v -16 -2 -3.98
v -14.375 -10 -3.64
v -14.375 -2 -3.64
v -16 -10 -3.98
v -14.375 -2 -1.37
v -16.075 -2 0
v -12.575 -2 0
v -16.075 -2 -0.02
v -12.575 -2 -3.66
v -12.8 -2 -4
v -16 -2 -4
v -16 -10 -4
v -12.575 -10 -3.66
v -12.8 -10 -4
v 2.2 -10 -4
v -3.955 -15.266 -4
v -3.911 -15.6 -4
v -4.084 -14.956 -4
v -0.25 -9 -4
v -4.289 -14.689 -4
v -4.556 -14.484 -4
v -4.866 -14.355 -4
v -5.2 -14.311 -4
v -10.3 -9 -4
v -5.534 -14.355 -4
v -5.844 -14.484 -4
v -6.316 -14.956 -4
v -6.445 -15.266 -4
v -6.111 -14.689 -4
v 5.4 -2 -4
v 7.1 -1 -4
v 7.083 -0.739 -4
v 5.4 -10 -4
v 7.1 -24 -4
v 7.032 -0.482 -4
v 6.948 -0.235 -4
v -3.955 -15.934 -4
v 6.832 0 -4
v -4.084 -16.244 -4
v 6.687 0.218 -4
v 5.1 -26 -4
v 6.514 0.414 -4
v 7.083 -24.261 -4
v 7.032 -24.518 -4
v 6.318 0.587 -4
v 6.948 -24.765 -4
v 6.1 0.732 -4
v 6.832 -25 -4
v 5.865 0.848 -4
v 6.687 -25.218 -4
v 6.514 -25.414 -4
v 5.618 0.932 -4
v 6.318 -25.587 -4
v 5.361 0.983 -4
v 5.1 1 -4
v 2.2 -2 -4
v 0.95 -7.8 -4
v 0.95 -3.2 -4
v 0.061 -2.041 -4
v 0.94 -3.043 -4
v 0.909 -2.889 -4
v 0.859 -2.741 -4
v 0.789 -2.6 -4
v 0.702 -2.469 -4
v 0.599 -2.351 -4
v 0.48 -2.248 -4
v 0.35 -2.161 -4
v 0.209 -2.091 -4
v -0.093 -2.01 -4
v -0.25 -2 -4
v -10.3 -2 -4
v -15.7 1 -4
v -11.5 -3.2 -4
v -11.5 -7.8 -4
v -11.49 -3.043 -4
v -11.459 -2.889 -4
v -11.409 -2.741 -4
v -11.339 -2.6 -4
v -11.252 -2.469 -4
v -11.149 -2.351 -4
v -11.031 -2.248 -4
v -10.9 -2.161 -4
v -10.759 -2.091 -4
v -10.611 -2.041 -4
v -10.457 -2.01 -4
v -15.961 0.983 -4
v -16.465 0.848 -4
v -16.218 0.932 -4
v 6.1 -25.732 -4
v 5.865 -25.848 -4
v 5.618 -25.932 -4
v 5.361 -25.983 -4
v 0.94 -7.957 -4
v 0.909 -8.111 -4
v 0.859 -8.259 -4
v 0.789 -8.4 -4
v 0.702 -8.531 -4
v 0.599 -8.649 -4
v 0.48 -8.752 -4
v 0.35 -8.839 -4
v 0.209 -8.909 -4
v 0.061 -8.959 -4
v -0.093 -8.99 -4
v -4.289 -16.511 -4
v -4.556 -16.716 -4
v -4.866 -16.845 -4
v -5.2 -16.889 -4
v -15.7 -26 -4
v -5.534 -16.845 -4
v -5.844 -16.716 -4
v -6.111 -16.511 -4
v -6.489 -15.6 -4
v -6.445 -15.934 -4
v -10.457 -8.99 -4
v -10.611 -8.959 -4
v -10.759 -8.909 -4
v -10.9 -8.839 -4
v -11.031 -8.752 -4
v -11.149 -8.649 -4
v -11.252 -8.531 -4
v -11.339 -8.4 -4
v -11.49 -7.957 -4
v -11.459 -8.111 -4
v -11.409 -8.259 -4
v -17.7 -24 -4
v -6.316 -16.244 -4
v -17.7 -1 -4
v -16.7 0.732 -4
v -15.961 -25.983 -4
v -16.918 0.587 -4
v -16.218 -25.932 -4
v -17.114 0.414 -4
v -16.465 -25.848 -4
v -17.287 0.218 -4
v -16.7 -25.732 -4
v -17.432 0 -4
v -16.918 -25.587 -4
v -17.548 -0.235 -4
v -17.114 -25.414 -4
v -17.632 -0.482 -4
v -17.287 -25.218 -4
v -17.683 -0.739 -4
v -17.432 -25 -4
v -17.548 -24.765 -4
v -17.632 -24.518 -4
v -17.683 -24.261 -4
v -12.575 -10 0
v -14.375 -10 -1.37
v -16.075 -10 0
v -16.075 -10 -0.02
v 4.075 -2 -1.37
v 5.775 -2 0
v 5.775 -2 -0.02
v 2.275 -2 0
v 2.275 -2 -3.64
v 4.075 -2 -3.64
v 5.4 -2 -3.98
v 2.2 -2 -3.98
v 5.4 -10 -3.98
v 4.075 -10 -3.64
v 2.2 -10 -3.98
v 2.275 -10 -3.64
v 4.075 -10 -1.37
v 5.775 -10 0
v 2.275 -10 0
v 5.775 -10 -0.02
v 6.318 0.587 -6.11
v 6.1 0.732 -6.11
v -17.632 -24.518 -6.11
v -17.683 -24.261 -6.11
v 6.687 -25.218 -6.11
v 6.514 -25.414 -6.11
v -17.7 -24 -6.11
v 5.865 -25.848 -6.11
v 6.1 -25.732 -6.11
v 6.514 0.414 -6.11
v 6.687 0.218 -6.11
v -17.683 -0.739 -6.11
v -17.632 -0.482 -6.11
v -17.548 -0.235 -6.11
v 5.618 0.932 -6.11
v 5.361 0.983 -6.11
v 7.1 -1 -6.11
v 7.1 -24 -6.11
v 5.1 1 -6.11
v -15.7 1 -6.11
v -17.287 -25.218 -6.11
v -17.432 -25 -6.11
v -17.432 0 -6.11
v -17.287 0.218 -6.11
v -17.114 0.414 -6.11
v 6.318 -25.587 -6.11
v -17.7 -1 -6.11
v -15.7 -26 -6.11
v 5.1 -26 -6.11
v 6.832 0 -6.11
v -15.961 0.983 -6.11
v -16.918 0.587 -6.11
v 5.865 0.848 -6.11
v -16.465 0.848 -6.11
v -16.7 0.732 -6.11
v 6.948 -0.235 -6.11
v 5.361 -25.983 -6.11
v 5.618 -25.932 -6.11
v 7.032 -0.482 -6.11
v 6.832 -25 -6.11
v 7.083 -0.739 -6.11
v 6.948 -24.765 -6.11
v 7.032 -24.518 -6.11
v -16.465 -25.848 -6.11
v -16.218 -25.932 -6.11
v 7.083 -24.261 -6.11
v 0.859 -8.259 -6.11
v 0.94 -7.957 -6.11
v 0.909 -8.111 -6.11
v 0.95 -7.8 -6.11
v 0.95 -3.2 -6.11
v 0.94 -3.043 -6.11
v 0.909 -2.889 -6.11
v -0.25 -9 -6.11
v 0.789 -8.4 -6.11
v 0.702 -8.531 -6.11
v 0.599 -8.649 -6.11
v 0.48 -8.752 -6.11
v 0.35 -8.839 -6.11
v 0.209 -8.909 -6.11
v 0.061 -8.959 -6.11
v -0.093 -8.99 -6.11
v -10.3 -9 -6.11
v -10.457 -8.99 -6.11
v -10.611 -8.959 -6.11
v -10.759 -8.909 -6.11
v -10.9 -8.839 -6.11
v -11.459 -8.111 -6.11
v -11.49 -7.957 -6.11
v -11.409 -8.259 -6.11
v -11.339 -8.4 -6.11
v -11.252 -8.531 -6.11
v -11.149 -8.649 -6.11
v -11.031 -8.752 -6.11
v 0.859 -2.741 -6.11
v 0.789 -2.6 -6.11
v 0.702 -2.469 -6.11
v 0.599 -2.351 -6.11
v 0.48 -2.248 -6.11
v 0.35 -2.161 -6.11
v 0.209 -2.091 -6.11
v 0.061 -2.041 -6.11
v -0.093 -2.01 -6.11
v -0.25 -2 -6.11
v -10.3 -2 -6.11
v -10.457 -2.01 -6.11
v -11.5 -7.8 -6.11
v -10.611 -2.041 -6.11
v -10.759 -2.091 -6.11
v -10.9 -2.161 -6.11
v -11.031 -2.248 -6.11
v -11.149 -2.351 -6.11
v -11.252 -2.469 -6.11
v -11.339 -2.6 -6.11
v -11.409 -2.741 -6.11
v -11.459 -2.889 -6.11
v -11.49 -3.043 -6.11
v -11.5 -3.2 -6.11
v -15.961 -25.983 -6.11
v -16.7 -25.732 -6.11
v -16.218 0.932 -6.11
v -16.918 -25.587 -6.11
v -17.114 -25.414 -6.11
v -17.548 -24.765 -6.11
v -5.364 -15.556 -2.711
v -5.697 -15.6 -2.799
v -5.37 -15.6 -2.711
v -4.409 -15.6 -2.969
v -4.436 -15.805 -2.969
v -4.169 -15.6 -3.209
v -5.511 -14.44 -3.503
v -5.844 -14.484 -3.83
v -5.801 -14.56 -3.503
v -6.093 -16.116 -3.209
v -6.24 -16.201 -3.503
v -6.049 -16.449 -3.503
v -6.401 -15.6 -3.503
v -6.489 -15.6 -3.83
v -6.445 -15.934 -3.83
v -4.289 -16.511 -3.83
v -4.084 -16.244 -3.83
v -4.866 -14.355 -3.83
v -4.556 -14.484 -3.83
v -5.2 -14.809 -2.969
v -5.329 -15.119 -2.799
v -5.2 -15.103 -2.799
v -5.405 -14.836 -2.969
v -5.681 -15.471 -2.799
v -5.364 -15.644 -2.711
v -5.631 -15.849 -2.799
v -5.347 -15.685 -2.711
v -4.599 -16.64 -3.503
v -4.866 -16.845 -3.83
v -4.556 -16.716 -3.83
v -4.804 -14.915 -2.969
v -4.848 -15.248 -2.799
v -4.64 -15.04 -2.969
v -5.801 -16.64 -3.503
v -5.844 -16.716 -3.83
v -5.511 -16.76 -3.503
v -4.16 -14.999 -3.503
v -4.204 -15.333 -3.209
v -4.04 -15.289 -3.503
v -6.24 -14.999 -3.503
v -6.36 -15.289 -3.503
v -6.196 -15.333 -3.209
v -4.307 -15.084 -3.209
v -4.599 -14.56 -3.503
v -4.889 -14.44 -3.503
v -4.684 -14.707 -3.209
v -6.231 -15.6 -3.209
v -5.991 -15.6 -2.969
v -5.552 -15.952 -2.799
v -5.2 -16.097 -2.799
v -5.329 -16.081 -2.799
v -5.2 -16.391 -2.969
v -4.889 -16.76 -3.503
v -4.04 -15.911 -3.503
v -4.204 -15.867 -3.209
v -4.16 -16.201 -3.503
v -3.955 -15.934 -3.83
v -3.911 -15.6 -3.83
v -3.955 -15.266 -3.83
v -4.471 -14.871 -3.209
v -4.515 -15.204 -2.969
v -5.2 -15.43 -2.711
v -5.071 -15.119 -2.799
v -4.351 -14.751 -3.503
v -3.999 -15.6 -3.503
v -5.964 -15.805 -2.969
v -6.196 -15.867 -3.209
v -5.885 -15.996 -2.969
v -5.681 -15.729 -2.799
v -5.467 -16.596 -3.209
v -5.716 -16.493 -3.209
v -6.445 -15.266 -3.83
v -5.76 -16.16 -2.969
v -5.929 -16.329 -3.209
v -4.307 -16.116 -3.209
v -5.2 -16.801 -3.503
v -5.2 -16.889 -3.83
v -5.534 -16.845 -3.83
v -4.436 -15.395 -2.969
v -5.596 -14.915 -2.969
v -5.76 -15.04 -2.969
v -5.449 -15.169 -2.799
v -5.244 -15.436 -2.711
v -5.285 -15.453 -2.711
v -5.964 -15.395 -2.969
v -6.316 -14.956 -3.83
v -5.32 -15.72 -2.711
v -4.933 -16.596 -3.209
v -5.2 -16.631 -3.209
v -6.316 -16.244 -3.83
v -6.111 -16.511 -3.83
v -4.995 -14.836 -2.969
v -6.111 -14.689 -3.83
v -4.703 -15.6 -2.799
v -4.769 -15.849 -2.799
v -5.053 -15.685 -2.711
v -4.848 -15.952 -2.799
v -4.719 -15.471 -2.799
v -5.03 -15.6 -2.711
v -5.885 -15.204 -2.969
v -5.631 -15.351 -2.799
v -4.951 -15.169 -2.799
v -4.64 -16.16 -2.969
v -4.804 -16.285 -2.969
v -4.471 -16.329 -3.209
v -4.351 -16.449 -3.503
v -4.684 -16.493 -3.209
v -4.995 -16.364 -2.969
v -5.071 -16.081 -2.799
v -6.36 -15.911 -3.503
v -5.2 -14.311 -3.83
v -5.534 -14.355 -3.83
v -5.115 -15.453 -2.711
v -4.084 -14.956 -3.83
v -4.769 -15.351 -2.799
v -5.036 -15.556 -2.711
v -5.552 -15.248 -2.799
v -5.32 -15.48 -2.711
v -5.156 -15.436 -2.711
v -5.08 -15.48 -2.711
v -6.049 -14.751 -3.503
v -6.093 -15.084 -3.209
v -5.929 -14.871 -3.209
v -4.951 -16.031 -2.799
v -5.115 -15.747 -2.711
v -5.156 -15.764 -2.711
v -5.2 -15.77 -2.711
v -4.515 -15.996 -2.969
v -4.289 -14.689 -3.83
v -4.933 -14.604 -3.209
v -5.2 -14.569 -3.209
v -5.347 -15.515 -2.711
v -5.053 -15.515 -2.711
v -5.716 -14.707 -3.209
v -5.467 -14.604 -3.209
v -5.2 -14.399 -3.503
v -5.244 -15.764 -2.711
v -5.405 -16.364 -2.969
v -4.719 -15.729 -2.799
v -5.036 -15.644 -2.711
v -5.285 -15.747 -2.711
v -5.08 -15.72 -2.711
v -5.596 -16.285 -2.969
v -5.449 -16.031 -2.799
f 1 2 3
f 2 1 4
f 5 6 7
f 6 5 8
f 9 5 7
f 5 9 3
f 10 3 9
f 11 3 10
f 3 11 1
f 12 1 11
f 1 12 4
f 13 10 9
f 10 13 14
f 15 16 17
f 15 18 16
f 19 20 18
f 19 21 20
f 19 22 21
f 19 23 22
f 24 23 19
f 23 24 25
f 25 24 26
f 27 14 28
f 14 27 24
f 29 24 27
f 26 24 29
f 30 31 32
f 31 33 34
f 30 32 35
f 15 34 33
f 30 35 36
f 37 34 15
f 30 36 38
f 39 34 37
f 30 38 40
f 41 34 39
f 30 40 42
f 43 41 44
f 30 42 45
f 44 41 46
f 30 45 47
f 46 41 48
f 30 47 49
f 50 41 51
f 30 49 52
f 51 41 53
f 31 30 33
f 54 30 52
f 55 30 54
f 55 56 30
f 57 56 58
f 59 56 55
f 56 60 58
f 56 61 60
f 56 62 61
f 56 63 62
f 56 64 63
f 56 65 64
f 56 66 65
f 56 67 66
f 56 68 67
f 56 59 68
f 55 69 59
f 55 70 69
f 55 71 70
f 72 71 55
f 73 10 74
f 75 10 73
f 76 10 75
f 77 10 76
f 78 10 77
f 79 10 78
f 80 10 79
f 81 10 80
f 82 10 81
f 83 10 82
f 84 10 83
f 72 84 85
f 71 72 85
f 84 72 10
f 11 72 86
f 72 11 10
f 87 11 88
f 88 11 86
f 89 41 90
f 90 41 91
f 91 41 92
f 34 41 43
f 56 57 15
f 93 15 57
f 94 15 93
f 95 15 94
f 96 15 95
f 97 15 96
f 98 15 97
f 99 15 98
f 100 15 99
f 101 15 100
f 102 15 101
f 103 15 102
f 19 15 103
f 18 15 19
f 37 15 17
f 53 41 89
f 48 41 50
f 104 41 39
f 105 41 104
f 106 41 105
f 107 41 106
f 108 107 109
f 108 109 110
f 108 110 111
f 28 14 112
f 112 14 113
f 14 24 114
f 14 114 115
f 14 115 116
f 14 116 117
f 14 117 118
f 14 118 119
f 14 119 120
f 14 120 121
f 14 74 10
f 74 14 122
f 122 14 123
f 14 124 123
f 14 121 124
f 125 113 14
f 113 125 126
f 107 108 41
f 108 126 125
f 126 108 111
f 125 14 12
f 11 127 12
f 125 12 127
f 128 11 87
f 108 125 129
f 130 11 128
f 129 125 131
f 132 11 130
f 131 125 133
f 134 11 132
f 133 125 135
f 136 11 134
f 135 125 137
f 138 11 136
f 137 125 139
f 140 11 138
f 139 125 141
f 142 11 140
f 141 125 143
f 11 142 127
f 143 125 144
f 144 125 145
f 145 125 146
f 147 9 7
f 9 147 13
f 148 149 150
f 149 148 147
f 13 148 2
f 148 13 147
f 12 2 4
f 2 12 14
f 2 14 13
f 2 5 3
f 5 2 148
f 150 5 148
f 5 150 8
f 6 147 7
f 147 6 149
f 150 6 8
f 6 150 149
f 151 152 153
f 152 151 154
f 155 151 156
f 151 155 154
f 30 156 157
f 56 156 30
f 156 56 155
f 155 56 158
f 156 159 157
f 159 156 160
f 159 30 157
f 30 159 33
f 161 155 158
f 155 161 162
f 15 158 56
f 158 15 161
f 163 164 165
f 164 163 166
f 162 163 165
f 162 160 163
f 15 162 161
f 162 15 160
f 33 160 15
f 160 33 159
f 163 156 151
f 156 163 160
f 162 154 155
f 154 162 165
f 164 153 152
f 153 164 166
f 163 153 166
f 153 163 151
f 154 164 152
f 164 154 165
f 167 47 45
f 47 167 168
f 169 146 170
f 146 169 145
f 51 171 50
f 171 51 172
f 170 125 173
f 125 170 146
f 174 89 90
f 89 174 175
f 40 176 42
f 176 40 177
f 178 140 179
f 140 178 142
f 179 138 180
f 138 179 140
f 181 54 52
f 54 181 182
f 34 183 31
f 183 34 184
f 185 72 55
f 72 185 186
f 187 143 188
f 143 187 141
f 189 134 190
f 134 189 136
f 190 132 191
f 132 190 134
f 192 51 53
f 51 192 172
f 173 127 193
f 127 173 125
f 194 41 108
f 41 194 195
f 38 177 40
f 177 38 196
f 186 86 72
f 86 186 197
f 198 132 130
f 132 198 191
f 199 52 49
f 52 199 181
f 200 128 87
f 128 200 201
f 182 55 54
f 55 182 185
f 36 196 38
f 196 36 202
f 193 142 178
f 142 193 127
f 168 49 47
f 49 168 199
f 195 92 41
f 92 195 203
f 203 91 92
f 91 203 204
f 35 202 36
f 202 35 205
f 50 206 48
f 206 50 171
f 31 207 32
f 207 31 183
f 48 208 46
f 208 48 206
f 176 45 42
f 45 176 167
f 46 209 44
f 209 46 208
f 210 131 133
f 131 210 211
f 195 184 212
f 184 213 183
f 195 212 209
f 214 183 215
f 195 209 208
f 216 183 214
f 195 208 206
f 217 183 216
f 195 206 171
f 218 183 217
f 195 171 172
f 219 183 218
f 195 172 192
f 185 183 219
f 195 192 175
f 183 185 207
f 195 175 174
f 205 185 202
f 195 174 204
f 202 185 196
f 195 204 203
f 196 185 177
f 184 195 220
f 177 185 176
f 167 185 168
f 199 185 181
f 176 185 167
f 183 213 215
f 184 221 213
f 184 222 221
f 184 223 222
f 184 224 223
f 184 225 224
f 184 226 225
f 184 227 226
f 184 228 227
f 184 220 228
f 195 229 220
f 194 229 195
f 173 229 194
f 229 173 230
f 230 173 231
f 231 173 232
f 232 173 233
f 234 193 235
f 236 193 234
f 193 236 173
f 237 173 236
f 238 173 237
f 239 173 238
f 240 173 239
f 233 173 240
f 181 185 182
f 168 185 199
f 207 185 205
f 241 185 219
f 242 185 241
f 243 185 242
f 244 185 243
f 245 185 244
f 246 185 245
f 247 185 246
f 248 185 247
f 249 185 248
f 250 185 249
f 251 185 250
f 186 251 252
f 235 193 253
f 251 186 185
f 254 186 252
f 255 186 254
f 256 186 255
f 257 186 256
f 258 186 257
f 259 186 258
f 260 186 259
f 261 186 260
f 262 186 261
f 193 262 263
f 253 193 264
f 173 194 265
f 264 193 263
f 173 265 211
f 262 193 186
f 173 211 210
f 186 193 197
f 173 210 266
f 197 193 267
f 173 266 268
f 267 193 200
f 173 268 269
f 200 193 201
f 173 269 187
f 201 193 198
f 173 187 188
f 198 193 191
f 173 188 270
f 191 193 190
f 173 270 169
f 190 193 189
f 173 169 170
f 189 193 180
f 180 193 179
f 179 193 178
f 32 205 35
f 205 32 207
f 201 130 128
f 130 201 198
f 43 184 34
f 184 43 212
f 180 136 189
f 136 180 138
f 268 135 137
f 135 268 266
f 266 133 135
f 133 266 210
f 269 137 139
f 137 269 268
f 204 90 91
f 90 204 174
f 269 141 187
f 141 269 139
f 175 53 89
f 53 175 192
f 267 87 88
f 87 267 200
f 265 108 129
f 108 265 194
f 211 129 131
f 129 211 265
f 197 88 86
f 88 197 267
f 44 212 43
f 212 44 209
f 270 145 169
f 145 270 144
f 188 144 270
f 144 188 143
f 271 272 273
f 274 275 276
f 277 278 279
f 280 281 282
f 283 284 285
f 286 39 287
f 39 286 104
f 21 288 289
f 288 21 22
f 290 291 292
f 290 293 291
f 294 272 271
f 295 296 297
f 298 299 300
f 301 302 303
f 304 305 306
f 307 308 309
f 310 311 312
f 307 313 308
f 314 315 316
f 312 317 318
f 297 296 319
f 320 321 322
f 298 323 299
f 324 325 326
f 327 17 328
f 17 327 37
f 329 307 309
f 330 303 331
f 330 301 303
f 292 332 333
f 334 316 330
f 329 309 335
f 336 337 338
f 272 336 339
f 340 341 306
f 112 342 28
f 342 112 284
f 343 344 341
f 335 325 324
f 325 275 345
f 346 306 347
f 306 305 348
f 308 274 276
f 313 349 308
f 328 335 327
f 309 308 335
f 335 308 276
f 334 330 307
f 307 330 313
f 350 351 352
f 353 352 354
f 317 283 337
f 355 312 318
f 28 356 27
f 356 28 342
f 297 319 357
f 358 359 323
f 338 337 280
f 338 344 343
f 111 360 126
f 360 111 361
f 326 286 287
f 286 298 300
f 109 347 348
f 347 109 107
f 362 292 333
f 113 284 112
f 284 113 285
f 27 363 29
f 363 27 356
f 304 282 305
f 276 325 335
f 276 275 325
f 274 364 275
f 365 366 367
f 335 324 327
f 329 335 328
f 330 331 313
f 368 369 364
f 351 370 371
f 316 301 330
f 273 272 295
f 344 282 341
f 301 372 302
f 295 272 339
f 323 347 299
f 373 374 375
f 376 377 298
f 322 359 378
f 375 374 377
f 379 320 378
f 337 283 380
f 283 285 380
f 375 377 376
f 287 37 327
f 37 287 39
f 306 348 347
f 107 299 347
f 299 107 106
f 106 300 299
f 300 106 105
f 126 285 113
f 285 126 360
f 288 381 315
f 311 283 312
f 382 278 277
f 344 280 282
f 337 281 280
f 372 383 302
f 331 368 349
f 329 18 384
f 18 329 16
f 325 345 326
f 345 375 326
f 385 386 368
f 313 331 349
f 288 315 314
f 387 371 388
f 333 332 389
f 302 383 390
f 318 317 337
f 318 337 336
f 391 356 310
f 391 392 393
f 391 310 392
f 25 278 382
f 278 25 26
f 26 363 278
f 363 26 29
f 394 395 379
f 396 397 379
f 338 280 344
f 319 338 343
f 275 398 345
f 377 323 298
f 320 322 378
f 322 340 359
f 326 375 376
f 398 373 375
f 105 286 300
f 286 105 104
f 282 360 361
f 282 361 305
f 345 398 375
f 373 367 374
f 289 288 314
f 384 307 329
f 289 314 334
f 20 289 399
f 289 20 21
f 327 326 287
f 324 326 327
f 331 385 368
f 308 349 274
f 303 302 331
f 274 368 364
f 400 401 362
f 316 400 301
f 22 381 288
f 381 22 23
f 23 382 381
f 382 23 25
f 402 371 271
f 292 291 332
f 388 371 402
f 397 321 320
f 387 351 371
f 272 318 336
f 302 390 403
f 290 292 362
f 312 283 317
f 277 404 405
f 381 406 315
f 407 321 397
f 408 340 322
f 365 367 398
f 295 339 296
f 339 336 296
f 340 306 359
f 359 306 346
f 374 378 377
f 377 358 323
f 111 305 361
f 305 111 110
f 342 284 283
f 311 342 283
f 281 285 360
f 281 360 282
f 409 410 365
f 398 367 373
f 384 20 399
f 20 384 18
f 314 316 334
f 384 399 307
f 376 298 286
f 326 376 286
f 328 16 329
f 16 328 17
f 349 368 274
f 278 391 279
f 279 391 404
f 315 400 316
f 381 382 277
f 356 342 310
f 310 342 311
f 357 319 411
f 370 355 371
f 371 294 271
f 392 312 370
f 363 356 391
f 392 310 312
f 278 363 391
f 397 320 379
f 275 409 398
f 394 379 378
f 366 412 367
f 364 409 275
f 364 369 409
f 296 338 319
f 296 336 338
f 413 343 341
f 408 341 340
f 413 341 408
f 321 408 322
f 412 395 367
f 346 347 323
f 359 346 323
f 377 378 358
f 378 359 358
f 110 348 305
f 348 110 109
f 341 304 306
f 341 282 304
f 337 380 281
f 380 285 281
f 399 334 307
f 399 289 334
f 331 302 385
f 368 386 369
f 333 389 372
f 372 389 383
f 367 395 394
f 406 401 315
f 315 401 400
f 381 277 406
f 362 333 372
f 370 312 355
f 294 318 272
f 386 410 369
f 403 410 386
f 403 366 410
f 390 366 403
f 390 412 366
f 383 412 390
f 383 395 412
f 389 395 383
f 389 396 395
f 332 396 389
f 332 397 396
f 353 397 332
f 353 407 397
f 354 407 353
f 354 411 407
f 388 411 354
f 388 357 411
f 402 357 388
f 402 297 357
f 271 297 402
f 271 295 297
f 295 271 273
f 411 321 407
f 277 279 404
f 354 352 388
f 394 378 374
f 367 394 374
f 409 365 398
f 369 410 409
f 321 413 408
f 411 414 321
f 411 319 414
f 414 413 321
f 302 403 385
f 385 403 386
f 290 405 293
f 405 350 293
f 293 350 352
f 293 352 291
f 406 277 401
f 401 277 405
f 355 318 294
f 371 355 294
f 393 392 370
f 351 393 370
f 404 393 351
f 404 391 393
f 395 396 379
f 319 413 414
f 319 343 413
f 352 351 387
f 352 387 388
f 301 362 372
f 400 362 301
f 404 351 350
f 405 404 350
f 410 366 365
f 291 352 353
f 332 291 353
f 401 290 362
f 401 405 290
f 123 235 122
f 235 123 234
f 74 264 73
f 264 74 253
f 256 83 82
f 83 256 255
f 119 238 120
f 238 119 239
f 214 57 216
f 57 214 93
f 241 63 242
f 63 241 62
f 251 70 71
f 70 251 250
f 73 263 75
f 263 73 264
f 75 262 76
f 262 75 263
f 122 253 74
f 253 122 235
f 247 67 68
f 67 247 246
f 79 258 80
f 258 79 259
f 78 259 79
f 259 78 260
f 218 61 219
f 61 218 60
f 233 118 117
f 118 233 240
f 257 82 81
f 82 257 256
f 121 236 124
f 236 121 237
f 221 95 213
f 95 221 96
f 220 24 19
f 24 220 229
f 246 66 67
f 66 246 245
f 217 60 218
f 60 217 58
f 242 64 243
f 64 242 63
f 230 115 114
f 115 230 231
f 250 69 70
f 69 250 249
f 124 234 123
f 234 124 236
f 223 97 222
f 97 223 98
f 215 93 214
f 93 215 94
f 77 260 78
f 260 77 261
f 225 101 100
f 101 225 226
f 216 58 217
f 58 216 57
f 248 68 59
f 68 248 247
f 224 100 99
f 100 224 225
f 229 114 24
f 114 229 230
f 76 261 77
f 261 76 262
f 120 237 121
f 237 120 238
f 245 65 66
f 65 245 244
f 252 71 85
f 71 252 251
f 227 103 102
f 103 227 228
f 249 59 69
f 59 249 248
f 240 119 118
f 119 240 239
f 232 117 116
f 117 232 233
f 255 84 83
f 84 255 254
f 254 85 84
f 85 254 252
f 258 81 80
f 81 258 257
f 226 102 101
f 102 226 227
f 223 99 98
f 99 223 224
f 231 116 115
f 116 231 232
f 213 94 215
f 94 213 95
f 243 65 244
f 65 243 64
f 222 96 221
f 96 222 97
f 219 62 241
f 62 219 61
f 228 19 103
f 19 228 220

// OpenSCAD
// Standalone connector plate -- the piece that slides into the GameSir
// Cyclone-family controller's mount. Rebuilt natively in OpenSCAD from
// measurements taken off a real, watertight reference mesh
// (reference/connector_only.stl), rather than imported as an opaque mesh,
// so it can be freely extended/modified later without guessing what's
// safe to touch.
//
// Tab-clip size/position/profile, the plate footprint, and the USB-C slot
// are measured to match the reference mesh (these mate with real
// hardware); the corner fillets and the small alignment nub are close
// visual approximations, not exact -- they carry no mechanical function.
//
// The tabs are NOT plain posts -- they're snap-fit barbs: a base flush
// with the plate surface (no riser gap), blending immediately into a
// constant-width neck that slides through the controller's narrow lower
// opening, then a head that flares out in the wider pocket beyond.
//
// Print flat as-is: bottom face on the bed, tabs pointing up, no supports.

plate_w = 24.8; plate_l = 27; plate_t = 2.11; plate_corner_r = 2;
tab_y = -10.0; tab_l = 8.0;

// Depth budget: base to head tip, starting flush at the plate surface
// (Z = plate_top_z) -- confirmed by hand-sketch (option D) that the neck
// must start with zero gap/recess below it, not sit atop a tall separate
// base riser like the first cut did.
plate_top_z = -4.0; plate_bottom_z = -6.11;
tab_z0 = plate_top_z;
// Depth budget arrived at through printed test-fit iteration (8mm guessed
// -> 4.5mm measured -> 3.5mm, still ~1mm too deep -> 4mm confirmed best
// via an A/B print test against a 3.5mm variant).
tab_base_blend_h = 0.34; // short transition from the wide base footprint to the neck, right at the plate surface
tab_z_neck_top = tab_z0 + 2.63; // neck runs most of the depth budget
tab_z1 = tab_z0 + 4.0; // full measured depth budget, head tip

// Neck inner-gap measured directly off the real controller with calipers
// (14.85mm, facing edges) -- center-to-center = 14.85 + neck_w = 16.65mm.
// base_x (the structural bond to the plate) stays at the reference mesh's
// original position; only neck/head -- the part that actually engages the
// controller -- are repositioned, preserving the previous midpoint.
tab1_base_x = -16.0; tab1_neck_x = -14.375;
tab2_base_x = 2.2; tab2_neck_x = 2.275;
// Each head flares away from the slot (not toward it) to avoid colliding
// with it now that the necks sit closer to center: tab1 keeps its neck's
// RIGHT edge flush and widens left; tab2 keeps its neck's LEFT edge flush
// and widens right.
tab1_head_x = tab1_neck_x - 1.7; // = tab1_neck_x + tab_neck_w - tab_head_w, right-edge flush
tab2_head_x = tab2_neck_x; // left-edge flush

// neck_w capped just under 1.85mm (the real controller's lower-opening
// width, measured) since the neck has to slide through it; head_w capped
// just under 3.6mm (measured max for the wider pocket beyond) -- both
// maximized within those limits for retention strength.
tab_base_w = 3.2; tab_neck_w = 1.8; tab_head_w = 3.5;
slot_x = -11.5; slot_y = -9; slot_w = 12.45; slot_h = 7; slot_corner_r = 1.2;
nub_x = -5.2; nub_y = -15.6; nub_r = 1.3;

$fn = 48;

module tab_clip(base_x, neck_x, head_x) {
    hull() {
        translate([base_x, tab_y, tab_z0]) cube([tab_base_w, tab_l, 0.02]);
        translate([neck_x, tab_y, tab_z0 + tab_base_blend_h]) cube([tab_neck_w, tab_l, 0.02]);
    }
    translate([neck_x, tab_y, tab_z0 + tab_base_blend_h])
        cube([tab_neck_w, tab_l, tab_z_neck_top - (tab_z0 + tab_base_blend_h)]);
    hull() {
        translate([neck_x, tab_y, tab_z_neck_top]) cube([tab_neck_w, tab_l, 0.02]);
        translate([head_x, tab_y, tab_z1 - 0.02]) cube([tab_head_w, tab_l, 0.02]);
    }
}

module connector_plate_native() {
    difference() {
        union() {
            translate([-17.7, -26, plate_bottom_z])
                linear_extrude(plate_t)
                    hull()
                        for (x = [plate_corner_r, plate_w - plate_corner_r])
                            for (y = [plate_corner_r, plate_l - plate_corner_r])
                                translate([x, y]) circle(r = plate_corner_r);
            tab_clip(tab1_base_x, tab1_neck_x, tab1_head_x);
            tab_clip(tab2_base_x, tab2_neck_x, tab2_head_x);
            translate([nub_x, nub_y, plate_top_z]) sphere(r = nub_r, $fn = 24);
        }
        translate([0, 0, plate_bottom_z - 1])
            linear_extrude(plate_t + 2)
                hull()
                    for (x = [slot_x + slot_corner_r, slot_x + slot_w - slot_corner_r])
                        for (y = [slot_y + slot_corner_r, slot_y + slot_h - slot_corner_r])
                            translate([x, y]) circle(r = slot_corner_r);
    }
}

connector_plate_native();
